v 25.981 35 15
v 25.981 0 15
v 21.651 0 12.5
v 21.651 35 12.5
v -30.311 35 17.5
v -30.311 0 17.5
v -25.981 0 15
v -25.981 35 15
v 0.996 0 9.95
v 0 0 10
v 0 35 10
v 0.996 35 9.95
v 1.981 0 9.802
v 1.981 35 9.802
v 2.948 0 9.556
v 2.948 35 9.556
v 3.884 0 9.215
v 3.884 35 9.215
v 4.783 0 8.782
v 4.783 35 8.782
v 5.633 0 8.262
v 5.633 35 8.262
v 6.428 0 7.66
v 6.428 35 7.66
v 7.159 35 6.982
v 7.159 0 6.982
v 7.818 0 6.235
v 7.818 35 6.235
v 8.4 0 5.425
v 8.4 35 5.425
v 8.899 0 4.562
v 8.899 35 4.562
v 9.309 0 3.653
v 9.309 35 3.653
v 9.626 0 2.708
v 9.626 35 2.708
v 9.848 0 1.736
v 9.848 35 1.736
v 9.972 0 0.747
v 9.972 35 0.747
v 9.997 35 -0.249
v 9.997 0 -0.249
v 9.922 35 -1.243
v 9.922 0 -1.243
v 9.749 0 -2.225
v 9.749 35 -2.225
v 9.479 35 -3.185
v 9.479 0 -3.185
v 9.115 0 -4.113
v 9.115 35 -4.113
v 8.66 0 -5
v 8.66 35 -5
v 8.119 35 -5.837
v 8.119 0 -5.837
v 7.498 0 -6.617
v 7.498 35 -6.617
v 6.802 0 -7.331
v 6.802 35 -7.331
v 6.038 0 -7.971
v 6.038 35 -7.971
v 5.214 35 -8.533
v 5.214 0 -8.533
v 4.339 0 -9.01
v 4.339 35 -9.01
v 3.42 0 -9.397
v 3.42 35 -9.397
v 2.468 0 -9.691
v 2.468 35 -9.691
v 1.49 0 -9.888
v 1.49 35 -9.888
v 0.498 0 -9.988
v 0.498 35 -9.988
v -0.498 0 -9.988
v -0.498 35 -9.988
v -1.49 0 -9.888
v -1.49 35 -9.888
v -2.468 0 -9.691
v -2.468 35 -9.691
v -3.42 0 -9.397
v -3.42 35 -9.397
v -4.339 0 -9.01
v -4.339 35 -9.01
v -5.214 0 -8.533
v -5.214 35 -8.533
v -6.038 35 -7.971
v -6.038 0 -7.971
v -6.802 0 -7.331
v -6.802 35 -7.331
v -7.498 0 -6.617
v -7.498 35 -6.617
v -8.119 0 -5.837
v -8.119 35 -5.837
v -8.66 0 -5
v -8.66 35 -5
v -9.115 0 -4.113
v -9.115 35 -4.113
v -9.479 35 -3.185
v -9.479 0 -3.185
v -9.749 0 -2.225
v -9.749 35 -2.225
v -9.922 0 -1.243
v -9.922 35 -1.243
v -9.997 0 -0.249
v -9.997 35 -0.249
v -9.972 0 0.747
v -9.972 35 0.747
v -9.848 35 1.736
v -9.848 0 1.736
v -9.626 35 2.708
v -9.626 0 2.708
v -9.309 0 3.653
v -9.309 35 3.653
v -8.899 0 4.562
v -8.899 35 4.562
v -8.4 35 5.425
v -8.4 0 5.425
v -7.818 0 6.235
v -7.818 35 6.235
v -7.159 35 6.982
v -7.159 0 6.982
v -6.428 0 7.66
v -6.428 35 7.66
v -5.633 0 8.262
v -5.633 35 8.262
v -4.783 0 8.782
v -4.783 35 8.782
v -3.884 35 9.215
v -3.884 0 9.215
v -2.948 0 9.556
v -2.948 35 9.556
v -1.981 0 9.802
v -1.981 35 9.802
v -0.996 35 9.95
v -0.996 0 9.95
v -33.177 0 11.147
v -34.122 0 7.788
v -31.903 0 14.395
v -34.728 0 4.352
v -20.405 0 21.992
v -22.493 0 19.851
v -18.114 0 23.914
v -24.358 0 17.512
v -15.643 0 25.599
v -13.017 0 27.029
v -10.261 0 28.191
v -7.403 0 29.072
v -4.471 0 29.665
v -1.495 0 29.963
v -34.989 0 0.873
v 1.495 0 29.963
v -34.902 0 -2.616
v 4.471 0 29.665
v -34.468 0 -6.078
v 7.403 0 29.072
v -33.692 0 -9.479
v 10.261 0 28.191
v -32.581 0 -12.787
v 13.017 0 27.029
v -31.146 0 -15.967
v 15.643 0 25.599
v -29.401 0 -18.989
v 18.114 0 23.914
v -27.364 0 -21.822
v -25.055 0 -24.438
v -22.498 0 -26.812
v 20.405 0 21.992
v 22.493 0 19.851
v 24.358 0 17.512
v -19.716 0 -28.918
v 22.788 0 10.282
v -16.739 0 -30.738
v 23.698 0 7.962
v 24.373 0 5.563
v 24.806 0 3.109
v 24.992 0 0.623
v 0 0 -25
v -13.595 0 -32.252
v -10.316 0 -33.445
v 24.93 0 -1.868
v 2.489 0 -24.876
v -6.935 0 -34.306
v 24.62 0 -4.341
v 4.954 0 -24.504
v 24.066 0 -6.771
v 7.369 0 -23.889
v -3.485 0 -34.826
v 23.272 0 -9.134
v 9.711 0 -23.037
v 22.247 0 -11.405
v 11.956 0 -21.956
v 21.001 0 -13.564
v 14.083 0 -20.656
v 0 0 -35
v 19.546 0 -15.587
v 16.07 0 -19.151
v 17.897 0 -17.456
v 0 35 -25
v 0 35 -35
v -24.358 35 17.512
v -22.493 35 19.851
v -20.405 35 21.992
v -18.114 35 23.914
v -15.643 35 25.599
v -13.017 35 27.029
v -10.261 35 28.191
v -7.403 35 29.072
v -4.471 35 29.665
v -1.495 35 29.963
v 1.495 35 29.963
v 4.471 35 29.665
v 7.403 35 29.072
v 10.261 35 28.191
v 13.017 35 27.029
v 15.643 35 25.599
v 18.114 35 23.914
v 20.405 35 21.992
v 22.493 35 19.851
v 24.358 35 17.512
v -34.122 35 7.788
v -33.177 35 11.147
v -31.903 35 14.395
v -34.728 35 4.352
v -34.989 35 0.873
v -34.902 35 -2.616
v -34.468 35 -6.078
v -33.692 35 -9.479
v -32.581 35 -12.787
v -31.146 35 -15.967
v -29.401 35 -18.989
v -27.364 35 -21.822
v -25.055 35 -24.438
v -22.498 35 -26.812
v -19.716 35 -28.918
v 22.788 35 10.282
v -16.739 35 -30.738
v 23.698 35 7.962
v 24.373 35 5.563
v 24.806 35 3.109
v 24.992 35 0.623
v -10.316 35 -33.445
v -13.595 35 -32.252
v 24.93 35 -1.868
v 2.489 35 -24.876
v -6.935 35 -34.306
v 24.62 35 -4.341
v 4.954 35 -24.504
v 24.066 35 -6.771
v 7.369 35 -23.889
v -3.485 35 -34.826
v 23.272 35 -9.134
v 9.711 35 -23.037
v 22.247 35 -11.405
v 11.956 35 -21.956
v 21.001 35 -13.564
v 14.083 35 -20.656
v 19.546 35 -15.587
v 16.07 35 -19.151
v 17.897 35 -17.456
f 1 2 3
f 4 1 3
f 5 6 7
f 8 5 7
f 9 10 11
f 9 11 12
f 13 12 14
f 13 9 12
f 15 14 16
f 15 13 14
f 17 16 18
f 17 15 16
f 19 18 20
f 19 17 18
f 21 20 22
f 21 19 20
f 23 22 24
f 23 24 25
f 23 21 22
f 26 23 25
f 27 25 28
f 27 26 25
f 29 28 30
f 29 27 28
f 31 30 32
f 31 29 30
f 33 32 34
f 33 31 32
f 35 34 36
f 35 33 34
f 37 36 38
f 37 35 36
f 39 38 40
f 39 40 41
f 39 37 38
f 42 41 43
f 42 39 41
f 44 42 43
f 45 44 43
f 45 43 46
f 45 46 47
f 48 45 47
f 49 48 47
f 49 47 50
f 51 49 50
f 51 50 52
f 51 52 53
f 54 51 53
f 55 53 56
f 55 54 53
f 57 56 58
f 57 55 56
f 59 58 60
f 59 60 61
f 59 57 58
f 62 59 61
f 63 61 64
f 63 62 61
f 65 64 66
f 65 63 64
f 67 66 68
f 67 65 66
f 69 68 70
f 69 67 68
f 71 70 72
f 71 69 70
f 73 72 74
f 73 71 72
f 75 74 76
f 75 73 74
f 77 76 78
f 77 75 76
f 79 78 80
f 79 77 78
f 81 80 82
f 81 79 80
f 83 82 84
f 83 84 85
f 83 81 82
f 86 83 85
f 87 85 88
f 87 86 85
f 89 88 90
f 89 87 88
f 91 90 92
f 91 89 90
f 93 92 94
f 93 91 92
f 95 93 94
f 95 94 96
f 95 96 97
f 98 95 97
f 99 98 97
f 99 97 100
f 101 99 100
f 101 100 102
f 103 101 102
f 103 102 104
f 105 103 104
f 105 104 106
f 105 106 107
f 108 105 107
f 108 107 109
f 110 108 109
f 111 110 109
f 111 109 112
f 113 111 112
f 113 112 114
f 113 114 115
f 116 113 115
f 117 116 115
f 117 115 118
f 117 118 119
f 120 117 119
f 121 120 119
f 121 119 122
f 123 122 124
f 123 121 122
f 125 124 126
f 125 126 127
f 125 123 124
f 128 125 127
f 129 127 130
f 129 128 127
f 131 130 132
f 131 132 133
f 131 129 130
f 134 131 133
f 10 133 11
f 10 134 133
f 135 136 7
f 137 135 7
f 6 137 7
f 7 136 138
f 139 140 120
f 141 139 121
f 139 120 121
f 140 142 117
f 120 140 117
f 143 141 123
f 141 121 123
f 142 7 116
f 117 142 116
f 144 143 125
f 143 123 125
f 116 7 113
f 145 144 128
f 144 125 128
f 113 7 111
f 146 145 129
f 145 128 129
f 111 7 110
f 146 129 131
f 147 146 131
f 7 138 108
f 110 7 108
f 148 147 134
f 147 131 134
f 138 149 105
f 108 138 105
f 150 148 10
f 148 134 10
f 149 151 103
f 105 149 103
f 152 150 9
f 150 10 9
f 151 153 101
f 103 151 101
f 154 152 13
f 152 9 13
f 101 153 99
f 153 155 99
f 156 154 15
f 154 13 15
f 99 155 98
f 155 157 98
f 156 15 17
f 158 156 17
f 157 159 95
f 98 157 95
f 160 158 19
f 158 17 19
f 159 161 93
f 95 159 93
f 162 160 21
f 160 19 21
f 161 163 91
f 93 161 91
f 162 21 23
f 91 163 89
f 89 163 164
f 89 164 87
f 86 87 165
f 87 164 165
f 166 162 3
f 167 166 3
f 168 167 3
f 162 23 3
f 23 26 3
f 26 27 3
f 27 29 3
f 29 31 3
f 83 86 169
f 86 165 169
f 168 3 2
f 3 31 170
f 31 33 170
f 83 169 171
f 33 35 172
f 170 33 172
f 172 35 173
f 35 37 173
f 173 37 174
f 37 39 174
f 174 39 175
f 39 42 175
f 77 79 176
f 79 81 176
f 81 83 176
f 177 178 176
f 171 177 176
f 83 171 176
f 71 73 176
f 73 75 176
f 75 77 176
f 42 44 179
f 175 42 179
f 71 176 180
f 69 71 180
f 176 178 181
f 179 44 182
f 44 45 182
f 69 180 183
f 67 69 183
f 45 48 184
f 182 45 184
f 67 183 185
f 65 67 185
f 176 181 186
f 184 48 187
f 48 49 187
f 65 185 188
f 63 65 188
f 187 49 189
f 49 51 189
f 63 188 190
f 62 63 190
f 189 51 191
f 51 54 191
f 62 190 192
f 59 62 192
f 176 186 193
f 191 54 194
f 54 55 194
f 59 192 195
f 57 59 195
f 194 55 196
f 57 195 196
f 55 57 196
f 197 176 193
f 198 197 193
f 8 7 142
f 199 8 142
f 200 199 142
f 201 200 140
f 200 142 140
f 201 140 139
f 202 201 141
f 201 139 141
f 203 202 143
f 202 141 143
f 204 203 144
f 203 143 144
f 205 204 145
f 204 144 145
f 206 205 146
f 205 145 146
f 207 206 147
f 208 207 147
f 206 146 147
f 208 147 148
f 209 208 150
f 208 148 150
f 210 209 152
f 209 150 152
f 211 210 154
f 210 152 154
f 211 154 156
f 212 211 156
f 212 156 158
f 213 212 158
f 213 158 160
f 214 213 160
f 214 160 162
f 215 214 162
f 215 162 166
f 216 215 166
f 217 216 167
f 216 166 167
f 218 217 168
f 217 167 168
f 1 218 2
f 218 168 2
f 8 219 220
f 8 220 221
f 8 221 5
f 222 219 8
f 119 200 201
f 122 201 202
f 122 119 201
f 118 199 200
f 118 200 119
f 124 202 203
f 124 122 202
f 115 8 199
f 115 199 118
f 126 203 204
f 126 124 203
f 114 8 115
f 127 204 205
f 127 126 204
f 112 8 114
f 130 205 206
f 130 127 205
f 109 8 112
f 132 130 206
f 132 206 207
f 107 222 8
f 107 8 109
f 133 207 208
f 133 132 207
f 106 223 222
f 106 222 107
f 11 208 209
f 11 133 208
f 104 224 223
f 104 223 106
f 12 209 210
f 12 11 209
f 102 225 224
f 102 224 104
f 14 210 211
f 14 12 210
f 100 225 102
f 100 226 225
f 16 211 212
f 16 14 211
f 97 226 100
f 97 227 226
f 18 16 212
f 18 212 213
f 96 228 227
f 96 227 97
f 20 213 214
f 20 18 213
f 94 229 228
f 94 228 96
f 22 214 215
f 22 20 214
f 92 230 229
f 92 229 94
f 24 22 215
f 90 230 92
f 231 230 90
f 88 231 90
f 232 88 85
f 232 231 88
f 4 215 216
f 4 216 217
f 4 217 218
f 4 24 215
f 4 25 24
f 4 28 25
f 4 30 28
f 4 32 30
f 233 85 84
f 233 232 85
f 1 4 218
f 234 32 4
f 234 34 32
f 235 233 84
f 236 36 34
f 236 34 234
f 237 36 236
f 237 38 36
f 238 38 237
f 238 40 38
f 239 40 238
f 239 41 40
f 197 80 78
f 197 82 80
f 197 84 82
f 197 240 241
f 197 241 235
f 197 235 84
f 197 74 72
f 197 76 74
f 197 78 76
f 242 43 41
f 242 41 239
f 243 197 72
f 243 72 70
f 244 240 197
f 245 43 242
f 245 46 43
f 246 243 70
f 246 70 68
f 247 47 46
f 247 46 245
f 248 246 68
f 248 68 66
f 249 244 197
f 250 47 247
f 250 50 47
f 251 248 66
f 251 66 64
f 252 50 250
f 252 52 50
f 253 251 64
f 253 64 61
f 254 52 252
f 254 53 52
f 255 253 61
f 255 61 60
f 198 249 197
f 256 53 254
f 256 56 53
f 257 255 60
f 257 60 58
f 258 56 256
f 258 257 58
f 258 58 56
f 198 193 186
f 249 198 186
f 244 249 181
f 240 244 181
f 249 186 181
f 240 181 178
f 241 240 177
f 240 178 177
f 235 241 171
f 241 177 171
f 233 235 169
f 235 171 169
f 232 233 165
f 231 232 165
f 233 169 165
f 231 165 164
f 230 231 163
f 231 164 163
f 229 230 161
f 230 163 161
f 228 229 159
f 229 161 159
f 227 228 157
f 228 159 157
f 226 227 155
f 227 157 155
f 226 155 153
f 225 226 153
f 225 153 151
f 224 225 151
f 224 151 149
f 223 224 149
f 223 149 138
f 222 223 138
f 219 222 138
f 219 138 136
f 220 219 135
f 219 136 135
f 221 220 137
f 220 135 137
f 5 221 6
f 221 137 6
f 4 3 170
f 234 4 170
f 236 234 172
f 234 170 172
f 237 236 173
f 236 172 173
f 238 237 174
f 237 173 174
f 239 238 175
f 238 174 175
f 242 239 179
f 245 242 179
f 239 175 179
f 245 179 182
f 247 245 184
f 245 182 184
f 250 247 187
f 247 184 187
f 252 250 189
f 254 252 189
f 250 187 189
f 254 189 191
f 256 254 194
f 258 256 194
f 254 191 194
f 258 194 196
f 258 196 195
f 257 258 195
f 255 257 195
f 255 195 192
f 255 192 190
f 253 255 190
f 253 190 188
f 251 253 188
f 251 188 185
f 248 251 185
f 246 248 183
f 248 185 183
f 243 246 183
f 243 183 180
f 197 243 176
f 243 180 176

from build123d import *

# Parameters (mm, degrees)
SKETCH1_R           = 10
BOSS_EXTRUDE1_DEPTH = 35


with BuildPart() as part:
    # Sketch1 → Boss-Extrude1 (new body)
    with BuildSketch(Plane(origin=(0, 0, 0), x_dir=(1, 0, 0), z_dir=(0, 1, 0))):
        with BuildLine():
            Line((0, 25), (0, 30))
            Line((0, 30), (0, 35))
            ThreePointArc((0, 35), (-30.310889132, 17.5), (-30.310889132, -17.5))
            Line((-30.310889132, -17.5), (-25.980762114, -15))
            ThreePointArc((-25.980762114, -15), (0, -30), (25.980762114, -15))
            Line((25.980762114, -15), (21.650635095, -12.5))
            ThreePointArc((21.650635095, -12.5), (21.650635095, 12.5), (0, 25))
        make_face()
        with Locations(Location((0, 0, 0), (0, 0, 270))):
            Circle(SKETCH1_R, mode=Mode.SUBTRACT)
    extrude(amount=BOSS_EXTRUDE1_DEPTH)


solid = part.part
